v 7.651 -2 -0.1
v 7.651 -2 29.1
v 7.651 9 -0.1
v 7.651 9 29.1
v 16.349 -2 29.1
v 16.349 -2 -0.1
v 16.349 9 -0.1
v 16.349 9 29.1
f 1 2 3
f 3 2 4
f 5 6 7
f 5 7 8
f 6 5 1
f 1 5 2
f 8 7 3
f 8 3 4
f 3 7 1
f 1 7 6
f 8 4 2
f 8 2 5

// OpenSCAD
// Generated by the canonical parent Python sources and validated exchange pipeline.
polyhedron(points=[[7.651368618011475, -2.0, -0.10000000149011612], [7.651368618011475, -2.0, 29.100000381469727], [7.651368618011475, 9.0, -0.10000000149011612], [7.651368618011475, 9.0, 29.100000381469727], [16.348630905151367, -2.0, 29.100000381469727], [16.348630905151367, -2.0, -0.10000000149011612], [16.348630905151367, 9.0, -0.10000000149011612], [16.348630905151367, 9.0, 29.100000381469727]],faces=[[2, 1, 0], [3, 1, 2], [6, 5, 4], [7, 6, 4], [0, 4, 5], [1, 4, 0], [2, 6, 7], [3, 2, 7], [0, 6, 2], [5, 6, 0], [1, 3, 7], [4, 1, 7]],convexity=10);
